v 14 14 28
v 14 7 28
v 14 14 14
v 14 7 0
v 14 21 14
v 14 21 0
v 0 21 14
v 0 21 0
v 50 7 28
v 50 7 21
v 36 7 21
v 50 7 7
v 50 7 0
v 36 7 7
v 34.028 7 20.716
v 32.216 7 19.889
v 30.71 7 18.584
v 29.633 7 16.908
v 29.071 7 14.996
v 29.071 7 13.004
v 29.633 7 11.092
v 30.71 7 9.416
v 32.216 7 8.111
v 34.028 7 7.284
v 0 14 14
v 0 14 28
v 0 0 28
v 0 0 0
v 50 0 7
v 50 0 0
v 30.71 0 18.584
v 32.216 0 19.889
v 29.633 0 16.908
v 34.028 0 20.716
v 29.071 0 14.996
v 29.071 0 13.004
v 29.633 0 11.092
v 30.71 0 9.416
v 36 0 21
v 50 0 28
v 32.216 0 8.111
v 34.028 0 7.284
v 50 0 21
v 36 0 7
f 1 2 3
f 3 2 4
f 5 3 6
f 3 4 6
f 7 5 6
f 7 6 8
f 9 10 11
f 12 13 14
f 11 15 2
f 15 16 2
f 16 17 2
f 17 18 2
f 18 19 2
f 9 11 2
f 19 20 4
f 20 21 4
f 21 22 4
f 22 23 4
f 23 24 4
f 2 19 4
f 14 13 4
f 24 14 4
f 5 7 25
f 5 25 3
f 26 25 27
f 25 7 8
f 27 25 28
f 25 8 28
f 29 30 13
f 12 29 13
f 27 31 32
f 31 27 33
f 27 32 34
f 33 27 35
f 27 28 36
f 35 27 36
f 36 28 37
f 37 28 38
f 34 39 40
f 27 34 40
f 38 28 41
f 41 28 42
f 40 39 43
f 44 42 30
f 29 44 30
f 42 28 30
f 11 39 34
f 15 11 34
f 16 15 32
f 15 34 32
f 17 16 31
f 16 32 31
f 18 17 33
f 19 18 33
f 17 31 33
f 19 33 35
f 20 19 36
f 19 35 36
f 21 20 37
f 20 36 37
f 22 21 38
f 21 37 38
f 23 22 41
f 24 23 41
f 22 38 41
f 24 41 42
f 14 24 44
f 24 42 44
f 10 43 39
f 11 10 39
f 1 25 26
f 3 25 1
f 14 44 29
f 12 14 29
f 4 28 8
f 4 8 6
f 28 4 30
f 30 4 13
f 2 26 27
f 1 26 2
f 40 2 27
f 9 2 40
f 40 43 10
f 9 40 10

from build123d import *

# Parameters (mm, degrees)
EXTRUDE_1_DEPTH     = 28
SKETCH_2_W          = 14
SKETCH_2_H          = 14
CUT_EXTRUDE_1_DEPTH = 7
CUT_EXTRUDE_2_REACH = 23


with BuildPart() as part:
    # 스케치1 → 보스-돌출1 (new body)
    with BuildSketch(Plane.XY):
        Polygon((14, 7), (14, 21), (0, 21), (0, 0), (50, 0), (50, 7), align=None)
    extrude(amount=EXTRUDE_1_DEPTH)

    # 스케치2 → 컷-돌출1 (cut)
    with BuildSketch(Plane(origin=(0, 21, 0), x_dir=(1, 0, 0), z_dir=(0, 1, 0))):
        with Locations((7, -21)):
            Rectangle(SKETCH_2_W, SKETCH_2_H)
    extrude(amount=-CUT_EXTRUDE_1_DEPTH, mode=Mode.SUBTRACT)

    # 스케치3 → 컷-돌출2 (cut, up to next)
    with BuildSketch(Plane(origin=(0, 0, 0), x_dir=(1, 0, 0), z_dir=(0, 1, 0)), mode=Mode.PRIVATE) as cut_extrude_2_sk1:
        with BuildLine():
            Line((36, -7), (50, -7))
            Line((50, -7), (50, -21))
            Line((50, -21), (36, -21))
            ThreePointArc((36, -21), (29, -14), (36, -7))
        make_face()
    cut_extrude_2_tool1 = extrude(cut_extrude_2_sk1.sketch, amount=CUT_EXTRUDE_2_REACH, mode=Mode.PRIVATE) & part.part
    add(cut_extrude_2_tool1.solids().sort_by_distance((40.188509, 0, 14))[0], mode=Mode.SUBTRACT)


solid = part.part
